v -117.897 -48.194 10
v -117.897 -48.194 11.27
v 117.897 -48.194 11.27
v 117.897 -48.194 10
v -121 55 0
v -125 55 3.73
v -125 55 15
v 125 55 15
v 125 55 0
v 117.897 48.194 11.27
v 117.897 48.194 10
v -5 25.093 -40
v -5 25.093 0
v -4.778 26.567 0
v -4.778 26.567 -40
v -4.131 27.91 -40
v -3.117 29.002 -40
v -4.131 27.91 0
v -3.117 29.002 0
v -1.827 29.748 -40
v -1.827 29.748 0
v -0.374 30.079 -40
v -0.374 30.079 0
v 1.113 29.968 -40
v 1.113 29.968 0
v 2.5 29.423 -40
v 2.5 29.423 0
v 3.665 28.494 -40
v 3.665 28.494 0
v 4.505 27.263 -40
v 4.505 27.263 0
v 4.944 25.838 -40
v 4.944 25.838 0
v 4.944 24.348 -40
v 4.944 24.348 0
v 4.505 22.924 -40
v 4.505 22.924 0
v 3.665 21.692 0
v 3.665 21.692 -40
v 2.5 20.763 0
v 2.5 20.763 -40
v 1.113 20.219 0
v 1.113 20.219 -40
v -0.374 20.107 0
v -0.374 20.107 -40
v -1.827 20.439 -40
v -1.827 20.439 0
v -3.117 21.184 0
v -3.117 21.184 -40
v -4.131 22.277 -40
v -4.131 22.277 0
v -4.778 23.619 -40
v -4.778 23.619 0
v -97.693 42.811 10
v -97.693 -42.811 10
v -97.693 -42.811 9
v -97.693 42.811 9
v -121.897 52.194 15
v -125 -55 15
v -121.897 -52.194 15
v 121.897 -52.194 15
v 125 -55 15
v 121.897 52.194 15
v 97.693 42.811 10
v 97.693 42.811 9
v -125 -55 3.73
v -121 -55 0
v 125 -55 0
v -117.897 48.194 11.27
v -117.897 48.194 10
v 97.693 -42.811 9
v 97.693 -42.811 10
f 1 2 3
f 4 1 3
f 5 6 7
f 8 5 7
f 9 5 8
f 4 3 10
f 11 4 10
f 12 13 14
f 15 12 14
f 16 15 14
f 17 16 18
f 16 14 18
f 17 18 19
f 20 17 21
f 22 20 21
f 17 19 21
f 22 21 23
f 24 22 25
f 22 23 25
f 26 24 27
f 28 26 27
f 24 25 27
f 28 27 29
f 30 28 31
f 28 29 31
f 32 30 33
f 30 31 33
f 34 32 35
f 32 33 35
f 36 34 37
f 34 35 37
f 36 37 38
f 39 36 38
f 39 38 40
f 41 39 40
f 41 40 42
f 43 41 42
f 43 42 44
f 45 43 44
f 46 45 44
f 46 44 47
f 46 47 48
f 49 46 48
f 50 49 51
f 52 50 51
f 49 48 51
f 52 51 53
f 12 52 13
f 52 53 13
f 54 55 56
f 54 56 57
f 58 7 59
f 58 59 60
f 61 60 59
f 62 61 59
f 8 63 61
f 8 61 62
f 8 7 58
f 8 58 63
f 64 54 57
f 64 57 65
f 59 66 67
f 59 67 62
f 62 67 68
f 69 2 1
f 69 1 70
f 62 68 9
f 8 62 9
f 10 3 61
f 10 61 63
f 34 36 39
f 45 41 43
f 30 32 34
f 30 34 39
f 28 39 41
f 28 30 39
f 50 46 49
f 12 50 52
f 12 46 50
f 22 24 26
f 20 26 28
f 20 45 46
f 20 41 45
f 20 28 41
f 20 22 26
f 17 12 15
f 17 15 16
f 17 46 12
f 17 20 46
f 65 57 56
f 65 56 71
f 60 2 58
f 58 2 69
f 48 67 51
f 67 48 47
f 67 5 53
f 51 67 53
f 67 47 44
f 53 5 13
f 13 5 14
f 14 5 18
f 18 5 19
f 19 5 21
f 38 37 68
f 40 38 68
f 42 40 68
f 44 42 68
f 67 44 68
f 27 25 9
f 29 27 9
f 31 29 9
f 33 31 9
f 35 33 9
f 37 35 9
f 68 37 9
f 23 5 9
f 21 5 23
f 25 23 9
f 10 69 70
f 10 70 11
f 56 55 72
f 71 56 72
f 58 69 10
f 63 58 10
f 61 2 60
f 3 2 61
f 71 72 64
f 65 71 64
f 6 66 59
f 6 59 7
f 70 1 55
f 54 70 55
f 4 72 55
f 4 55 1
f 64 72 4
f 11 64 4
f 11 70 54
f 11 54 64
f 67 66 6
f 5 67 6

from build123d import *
from OCP.BRepFilletAPI import BRepFilletAPI_MakeChamfer

# Parameters (mm, degrees)
SKETCH_2_W          = 250
SKETCH_2_H          = 110
EXTRUDE_1_DEPTH     = 15
SKETCH_3_W          = 235.794340166
SKETCH_3_H          = 96.388664916
CUT_EXTRUDE_1_DEPTH = 5
SKETCH_4_W          = 195.385858248
SKETCH_4_H          = 85.621380658
CUT_EXTRUDE_2_DEPTH = 1
CHAMFER_1_SIZE      = 4
CHAMFER_1_SIZE2     = 3.730060345
SKETCH_6_R          = 5
EXTRUDE_2_DEPTH     = 40


with BuildPart() as part:
    # 草图2 → 凸台-拉伸1 (new body)
    with BuildSketch(Plane.XY):
        Rectangle(SKETCH_2_W, SKETCH_2_H)
    extrude(amount=EXTRUDE_1_DEPTH)

    # 草图3 → 切除-拉伸1 (cut)
    with BuildSketch(Plane.XY.offset(15)):
        Rectangle(SKETCH_3_W, SKETCH_3_H)
    extrude(amount=-CUT_EXTRUDE_1_DEPTH, mode=Mode.SUBTRACT)

    # 草图4 → 切除-拉伸2 (cut)
    with BuildSketch(Plane.XY.offset(10)):
        Rectangle(SKETCH_4_W, SKETCH_4_H)
    extrude(amount=-CUT_EXTRUDE_2_DEPTH, mode=Mode.SUBTRACT)

    # 倒角1: one chamfer whose edges measure the first distance from different faces: ONE call of the kernel's chamfer builder (chamfer() names one face for all edges)
    chamfer_1_edges_1 = [part.edges().sort_by_distance(p)[0] for p in [
        (117.897170083, 0, 15),
        (0, 48.194332458, 15),
        (-117.897170083, 0, 15),
        (0, -48.194332458, 15),
    ]]
    chamfer_1_side_1 = [part.faces().sort_by_distance(p)[0] for p in [
        (0, -52.268699943, 15),
    ]]
    chamfer_1_edges_2 = [part.edges().sort_by_distance(p)[0] for p in [
        (-125, 0, 0),
    ]]
    chamfer_1_side_2 = [part.faces().sort_by_distance(p)[0] for p in [
        (0, 0, 0),
    ]]
    chamfer_1 = BRepFilletAPI_MakeChamfer(part.part.solid().wrapped)
    for e in chamfer_1_edges_1:
        chamfer_1.Add(CHAMFER_1_SIZE, CHAMFER_1_SIZE2, e.wrapped, chamfer_1_side_1[0].wrapped)  # the first distance lies on this face
    for e in chamfer_1_edges_2:
        chamfer_1.Add(CHAMFER_1_SIZE, CHAMFER_1_SIZE2, e.wrapped, chamfer_1_side_2[0].wrapped)  # the first distance lies on this face
    add(Compound.cast(chamfer_1.Shape()), mode=Mode.REPLACE)

    # 草图6 → 凸台-拉伸2 (add)
    with BuildSketch(Plane(origin=(0, 0, 0), x_dir=(-1, 0, 0), z_dir=(0, 0, -1))):
        with Locations((0, 25.093271363)):
            Circle(SKETCH_6_R)
    extrude(amount=EXTRUDE_2_DEPTH)


solid = part.part
